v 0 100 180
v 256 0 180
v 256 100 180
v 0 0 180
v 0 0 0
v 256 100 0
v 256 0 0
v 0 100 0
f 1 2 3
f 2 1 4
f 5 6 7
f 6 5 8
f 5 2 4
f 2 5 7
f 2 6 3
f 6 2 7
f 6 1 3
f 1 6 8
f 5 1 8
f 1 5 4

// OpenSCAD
// The resolution variables:
$fa = 1;
$fs = 0.4;

// Main dimensions
mainBodyX = 256;
mainBodyY = 100;
mainBoxBodyZ = 150;
legsZ = 20;
specialBottomForCuttingLegsZ = 10; 
mainBodyZ = mainBoxBodyZ + legsZ + specialBottomForCuttingLegsZ;

// Main body
difference(){
    cube([mainBodyX,mainBodyY,mainBodyZ]);
}
